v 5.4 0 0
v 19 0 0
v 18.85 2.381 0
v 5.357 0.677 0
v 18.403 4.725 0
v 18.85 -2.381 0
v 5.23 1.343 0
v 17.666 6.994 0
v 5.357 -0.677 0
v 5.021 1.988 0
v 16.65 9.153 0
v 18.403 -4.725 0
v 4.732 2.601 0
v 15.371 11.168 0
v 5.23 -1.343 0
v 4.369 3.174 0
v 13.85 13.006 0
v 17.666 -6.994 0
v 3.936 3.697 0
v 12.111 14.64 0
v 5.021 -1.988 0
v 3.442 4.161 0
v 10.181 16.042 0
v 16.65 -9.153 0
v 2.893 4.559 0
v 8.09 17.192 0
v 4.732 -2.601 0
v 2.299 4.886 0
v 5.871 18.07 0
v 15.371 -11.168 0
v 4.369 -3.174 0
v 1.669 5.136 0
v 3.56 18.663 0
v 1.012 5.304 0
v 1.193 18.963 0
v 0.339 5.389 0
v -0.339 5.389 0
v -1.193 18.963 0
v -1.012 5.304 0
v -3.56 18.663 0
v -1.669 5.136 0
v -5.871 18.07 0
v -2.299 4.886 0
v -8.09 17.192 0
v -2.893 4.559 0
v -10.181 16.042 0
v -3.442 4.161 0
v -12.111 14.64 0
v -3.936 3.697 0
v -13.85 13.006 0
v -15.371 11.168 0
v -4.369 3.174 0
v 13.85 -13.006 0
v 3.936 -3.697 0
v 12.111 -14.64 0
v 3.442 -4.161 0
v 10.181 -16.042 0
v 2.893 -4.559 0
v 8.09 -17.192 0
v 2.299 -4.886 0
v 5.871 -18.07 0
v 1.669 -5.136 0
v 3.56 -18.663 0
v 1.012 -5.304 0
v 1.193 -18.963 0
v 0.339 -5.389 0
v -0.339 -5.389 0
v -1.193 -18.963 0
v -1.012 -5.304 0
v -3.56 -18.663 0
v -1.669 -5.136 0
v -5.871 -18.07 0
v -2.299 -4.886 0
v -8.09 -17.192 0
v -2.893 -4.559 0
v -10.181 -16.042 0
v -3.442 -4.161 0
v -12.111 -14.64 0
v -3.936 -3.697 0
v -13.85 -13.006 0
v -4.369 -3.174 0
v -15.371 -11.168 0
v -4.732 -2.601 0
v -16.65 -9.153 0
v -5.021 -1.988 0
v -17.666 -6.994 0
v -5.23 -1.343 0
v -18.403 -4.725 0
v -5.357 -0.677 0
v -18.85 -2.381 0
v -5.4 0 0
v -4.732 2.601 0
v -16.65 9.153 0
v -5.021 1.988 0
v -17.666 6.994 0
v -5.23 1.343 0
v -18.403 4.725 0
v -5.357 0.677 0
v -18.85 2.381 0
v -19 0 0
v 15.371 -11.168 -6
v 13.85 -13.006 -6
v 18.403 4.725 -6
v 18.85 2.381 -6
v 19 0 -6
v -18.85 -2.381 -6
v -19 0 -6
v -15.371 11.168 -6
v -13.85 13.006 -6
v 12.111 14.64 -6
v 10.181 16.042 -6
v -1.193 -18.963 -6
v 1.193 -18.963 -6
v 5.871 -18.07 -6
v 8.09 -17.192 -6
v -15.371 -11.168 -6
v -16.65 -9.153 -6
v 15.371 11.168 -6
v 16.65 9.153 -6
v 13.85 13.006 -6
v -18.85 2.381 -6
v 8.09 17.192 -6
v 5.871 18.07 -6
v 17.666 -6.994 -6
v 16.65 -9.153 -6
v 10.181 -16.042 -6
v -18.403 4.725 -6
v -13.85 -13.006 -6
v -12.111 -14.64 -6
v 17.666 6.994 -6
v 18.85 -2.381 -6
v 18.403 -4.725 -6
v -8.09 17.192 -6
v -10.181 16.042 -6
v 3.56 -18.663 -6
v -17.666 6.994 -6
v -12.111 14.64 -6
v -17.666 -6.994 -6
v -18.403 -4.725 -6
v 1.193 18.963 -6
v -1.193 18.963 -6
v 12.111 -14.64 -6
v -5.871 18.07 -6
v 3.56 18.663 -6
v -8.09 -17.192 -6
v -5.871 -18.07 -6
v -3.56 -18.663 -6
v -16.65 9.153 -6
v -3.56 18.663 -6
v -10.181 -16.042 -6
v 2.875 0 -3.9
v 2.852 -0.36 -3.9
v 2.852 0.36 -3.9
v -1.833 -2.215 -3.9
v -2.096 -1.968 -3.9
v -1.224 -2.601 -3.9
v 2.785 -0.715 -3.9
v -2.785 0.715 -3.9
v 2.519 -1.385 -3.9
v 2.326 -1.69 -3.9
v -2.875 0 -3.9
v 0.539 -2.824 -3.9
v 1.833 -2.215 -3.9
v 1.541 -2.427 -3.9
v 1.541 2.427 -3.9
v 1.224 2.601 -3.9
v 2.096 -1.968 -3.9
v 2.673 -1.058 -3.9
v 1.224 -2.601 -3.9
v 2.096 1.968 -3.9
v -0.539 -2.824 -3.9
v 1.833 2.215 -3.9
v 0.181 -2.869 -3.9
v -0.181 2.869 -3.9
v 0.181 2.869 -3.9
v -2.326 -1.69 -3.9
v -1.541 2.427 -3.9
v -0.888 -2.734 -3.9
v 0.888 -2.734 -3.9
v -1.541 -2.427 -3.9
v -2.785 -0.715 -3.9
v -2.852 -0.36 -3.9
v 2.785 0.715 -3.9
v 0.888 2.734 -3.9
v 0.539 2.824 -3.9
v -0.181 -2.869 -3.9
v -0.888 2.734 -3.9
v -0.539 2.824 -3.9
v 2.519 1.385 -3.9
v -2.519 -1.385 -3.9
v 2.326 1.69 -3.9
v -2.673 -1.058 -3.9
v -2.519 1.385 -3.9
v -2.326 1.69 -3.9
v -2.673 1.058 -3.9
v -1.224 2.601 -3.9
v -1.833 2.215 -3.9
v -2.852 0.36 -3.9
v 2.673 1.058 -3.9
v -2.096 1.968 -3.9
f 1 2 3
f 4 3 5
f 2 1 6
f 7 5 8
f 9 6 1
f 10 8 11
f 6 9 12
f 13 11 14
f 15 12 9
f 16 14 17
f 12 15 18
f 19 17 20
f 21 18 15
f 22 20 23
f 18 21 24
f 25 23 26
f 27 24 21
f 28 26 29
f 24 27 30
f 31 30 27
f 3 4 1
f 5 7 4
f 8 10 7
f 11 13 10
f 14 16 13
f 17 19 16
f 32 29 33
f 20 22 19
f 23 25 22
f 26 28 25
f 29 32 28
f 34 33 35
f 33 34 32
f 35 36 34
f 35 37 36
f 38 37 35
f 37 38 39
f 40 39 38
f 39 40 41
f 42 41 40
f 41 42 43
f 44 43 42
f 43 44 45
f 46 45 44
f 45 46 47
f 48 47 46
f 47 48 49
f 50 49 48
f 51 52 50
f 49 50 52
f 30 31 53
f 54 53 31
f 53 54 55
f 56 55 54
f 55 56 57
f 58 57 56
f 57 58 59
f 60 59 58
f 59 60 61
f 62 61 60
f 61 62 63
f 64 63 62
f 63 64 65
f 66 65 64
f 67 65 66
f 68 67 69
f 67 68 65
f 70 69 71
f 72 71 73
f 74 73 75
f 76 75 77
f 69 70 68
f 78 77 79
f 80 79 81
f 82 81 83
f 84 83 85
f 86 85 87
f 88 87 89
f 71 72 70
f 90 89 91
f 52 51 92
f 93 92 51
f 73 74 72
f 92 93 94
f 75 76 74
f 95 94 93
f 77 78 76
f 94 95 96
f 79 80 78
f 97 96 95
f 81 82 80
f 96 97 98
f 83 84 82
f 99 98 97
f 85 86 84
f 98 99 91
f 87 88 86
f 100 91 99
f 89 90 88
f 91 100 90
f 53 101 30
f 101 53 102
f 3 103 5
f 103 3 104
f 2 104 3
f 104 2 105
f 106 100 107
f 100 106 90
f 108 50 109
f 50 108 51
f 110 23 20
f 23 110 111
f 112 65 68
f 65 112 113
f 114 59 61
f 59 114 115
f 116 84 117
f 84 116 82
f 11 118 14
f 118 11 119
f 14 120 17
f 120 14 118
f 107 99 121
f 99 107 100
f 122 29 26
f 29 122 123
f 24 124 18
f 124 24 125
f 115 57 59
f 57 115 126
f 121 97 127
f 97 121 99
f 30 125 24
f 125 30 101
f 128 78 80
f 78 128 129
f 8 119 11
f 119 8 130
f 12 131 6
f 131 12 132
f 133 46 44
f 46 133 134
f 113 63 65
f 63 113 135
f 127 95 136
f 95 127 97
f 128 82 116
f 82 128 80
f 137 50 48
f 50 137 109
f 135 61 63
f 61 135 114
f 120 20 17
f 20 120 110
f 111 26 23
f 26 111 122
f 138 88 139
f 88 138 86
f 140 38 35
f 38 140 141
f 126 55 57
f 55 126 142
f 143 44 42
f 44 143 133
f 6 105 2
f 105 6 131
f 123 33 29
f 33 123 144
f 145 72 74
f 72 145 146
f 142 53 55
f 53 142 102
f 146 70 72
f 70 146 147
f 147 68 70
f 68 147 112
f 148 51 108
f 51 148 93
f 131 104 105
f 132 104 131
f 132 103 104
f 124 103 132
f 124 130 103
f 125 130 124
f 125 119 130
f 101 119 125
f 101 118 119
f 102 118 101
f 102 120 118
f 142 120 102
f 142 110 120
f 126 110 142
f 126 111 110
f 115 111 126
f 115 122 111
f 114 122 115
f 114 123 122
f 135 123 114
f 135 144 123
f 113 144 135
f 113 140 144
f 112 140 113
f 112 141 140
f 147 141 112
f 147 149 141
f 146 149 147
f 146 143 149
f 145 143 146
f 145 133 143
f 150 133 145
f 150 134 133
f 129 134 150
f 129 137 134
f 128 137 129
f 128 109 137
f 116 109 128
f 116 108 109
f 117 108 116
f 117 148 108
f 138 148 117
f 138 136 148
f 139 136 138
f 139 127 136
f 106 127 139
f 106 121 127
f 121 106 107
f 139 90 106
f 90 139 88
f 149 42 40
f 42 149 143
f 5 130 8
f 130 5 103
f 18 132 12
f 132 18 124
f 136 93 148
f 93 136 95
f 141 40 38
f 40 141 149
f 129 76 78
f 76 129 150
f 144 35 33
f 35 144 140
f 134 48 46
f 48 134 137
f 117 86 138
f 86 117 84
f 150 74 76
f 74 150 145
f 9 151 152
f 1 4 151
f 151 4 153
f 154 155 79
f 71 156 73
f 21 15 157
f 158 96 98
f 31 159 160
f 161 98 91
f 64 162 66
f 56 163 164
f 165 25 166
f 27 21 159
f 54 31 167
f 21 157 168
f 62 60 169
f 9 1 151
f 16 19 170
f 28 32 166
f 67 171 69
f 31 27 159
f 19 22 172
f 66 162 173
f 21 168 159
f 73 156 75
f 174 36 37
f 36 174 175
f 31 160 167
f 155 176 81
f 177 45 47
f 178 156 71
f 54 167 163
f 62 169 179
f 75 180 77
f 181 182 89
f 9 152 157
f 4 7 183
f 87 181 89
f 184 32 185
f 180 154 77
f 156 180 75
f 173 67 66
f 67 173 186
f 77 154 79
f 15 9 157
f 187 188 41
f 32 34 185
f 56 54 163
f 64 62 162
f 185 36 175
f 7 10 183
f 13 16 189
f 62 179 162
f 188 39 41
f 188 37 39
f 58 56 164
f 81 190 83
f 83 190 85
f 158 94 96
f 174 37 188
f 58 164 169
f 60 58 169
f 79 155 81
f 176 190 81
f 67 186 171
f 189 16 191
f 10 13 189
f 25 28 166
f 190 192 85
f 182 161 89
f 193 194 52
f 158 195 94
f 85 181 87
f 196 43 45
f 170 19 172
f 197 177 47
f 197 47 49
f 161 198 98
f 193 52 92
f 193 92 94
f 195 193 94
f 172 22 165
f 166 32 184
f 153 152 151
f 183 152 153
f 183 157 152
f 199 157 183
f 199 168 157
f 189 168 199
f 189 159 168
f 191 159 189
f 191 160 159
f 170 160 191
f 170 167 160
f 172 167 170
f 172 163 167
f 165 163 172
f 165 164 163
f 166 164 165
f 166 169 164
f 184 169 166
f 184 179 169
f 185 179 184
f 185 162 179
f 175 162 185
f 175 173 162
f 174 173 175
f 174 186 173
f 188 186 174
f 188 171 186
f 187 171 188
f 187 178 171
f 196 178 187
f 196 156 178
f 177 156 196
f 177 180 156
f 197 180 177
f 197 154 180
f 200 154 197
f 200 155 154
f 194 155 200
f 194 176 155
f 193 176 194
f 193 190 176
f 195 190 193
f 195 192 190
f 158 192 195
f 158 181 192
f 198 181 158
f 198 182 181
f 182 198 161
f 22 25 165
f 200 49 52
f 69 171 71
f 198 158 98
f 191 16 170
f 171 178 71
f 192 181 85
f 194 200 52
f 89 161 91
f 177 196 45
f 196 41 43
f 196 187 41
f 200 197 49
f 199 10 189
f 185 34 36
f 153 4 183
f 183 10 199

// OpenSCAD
$fn = 50;


difference() {
	union() {
		translate(v = [0, 0, -3.0000000000]) {
			cylinder(h = 3, r = 10.0000000000);
		}
		translate(v = [0, 0, -6.0000000000]) {
			cylinder(h = 6, r = 19.0000000000);
		}
	}
	union() {
		translate(v = [0, 0, 0]) {
			rotate(a = [0, 0, 0]) {
				difference() {
					union() {
						#translate(v = [0, 0, -3.0000000000]) {
							cylinder(h = 3, r = 2.6000000000);
						}
						#translate(v = [0, 0, -3.9000000000]) {
							cylinder(h = 3.9000000000, r1 = 2.8750000000, r2 = 5.4000000000);
						}
						#translate(v = [0, 0, -3.0000000000]) {
							cylinder(h = 3, r = 2.8750000000);
						}
						#translate(v = [0, 0, -3.0000000000]) {
							cylinder(h = 3, r = 2.6000000000);
						}
					}
					union();
				}
			}
		}
	}
}
